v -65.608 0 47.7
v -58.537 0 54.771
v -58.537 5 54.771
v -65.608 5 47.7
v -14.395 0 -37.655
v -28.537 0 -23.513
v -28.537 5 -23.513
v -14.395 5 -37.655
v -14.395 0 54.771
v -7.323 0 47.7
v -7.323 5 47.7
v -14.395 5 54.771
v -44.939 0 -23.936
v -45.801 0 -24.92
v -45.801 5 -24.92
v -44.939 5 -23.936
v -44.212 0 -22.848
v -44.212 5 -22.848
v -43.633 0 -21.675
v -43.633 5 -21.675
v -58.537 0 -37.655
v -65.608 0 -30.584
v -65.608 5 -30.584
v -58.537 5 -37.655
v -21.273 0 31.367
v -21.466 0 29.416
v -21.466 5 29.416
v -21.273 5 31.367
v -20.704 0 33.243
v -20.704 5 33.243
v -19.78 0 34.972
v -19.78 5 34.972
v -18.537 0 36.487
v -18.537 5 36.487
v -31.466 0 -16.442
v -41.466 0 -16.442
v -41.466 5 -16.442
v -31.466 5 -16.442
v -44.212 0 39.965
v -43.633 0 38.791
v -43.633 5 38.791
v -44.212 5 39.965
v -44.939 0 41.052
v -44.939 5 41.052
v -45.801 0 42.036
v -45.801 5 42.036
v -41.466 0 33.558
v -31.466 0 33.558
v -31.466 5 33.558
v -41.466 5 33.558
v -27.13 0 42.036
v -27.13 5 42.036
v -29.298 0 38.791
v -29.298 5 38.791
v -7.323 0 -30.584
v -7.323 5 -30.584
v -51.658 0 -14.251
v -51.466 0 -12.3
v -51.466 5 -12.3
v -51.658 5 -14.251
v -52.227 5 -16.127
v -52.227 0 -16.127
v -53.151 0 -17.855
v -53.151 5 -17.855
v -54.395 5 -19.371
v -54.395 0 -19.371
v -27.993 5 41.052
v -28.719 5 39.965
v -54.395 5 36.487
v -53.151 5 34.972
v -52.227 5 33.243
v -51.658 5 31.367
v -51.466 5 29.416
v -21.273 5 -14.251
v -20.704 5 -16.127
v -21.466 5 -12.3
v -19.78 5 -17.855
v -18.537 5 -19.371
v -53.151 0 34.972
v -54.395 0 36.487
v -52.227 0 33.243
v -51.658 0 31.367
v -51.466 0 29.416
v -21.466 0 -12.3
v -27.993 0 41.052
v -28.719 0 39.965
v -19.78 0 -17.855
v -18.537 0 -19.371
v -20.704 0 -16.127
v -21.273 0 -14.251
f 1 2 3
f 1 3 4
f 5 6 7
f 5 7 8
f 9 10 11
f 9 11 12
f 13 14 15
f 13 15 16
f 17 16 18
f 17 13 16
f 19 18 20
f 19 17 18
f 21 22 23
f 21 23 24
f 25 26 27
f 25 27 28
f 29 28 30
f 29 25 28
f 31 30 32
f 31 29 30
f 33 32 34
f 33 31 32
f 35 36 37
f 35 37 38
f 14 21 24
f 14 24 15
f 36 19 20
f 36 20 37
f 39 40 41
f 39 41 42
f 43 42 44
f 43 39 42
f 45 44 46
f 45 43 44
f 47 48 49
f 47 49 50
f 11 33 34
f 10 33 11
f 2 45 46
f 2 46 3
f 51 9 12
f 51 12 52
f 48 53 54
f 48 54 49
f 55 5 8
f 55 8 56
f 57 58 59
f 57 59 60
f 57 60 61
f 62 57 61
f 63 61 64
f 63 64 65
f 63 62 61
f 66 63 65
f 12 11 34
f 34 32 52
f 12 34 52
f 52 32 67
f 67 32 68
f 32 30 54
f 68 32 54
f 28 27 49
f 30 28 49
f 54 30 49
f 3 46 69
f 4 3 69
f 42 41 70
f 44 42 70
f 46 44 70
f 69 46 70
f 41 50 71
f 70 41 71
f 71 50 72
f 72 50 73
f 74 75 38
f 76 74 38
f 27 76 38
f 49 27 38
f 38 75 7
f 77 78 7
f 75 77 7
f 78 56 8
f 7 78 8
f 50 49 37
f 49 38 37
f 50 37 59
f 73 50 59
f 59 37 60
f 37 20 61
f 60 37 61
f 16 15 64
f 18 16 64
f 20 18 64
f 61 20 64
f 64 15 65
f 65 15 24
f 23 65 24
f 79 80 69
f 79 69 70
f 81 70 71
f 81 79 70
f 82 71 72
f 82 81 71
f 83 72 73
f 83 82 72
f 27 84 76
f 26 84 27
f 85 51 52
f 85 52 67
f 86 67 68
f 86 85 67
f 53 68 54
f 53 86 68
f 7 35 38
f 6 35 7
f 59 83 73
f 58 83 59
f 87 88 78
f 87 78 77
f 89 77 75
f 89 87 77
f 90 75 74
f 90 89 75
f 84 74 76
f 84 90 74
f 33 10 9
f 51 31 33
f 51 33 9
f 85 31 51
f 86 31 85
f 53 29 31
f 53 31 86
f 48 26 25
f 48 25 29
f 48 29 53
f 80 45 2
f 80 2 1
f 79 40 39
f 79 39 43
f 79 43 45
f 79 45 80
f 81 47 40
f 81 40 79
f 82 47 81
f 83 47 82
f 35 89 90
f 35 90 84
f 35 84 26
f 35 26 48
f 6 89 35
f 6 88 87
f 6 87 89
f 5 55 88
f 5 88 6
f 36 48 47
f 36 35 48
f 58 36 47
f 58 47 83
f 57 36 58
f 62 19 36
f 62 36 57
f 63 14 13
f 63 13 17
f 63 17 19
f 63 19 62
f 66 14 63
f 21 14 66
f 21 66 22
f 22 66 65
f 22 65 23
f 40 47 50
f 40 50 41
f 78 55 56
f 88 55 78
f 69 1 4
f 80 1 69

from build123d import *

# Parameters (mm, degrees)
BOSS_EXTRUDE1_DEPTH = 5


with BuildPart() as part:
    # Sketch1 → Boss-Extrude1 (new body)
    with BuildSketch(Plane(origin=(0, 0, 0), x_dir=(1, 0, 0), z_dir=(0, 1, 0))):
        with BuildLine():
            Line((-65.607722973, 30.584051311), (-58.536655161, 37.655119123))
            Line((-58.536655161, 37.655119123), (-45.801042376, 24.919506337))
            ThreePointArc((-45.801042376, 24.919506337), (-44.557414065, 23.404140856), (-43.633314863, 21.675272849))
            Line((-43.633314863, 21.675272849), (-41.465587349, 16.441915687))
            Line((-41.465587349, 16.441915687), (-31.465587349, 16.441915687))
            Line((-31.465587349, 16.441915687), (-28.536655161, 23.512983499))
            Line((-28.536655161, 23.512983499), (-14.394519538, 37.655119123))
            Line((-14.394519538, 37.655119123), (-7.323451726, 30.584051311))
            Line((-7.323451726, 30.584051311), (-18.536655161, 19.370847875))
            ThreePointArc((-18.536655161, 19.370847875), (-20.704382675, 16.126614387), (-21.465587349, 12.299780063))
            Line((-21.465587349, 12.299780063), (-21.465587349, -29.415948689))
            ThreePointArc((-21.465587349, -29.415948689), (-20.704382675, -33.242783013), (-18.536655161, -36.487016501))
            Line((-18.536655161, -36.487016501), (-7.323451726, -47.700219937))
            Line((-7.323451726, -47.700219937), (-14.394519538, -54.771287748))
            Line((-14.394519538, -54.771287748), (-27.130132323, -42.035674963))
            ThreePointArc((-27.130132323, -42.035674963), (-28.373760634, -40.520309481), (-29.297859836, -38.791441475))
            Line((-29.297859836, -38.791441475), (-31.465587349, -33.558084313))
            Line((-31.465587349, -33.558084313), (-41.465587349, -33.558084313))
            Line((-41.465587349, -33.558084313), (-43.633314863, -38.791441475))
            ThreePointArc((-43.633314863, -38.791441475), (-44.557414065, -40.520309481), (-45.801042376, -42.035674963))
            Line((-45.801042376, -42.035674963), (-58.536655161, -54.771287748))
            Line((-58.536655161, -54.771287748), (-65.607722973, -47.700219937))
            Line((-65.607722973, -47.700219937), (-54.394519538, -36.487016501))
            ThreePointArc((-54.394519538, -36.487016501), (-52.226792024, -33.242783013), (-51.465587349, -29.415948689))
            Line((-51.465587349, -29.415948689), (-51.465587349, 12.299780063))
            ThreePointArc((-51.465587349, 12.299780063), (-52.226792024, 16.126614387), (-54.394519538, 19.370847875))
            Line((-54.394519538, 19.370847875), (-65.607722973, 30.584051311))
        make_face()
    extrude(amount=BOSS_EXTRUDE1_DEPTH)


solid = part.part
